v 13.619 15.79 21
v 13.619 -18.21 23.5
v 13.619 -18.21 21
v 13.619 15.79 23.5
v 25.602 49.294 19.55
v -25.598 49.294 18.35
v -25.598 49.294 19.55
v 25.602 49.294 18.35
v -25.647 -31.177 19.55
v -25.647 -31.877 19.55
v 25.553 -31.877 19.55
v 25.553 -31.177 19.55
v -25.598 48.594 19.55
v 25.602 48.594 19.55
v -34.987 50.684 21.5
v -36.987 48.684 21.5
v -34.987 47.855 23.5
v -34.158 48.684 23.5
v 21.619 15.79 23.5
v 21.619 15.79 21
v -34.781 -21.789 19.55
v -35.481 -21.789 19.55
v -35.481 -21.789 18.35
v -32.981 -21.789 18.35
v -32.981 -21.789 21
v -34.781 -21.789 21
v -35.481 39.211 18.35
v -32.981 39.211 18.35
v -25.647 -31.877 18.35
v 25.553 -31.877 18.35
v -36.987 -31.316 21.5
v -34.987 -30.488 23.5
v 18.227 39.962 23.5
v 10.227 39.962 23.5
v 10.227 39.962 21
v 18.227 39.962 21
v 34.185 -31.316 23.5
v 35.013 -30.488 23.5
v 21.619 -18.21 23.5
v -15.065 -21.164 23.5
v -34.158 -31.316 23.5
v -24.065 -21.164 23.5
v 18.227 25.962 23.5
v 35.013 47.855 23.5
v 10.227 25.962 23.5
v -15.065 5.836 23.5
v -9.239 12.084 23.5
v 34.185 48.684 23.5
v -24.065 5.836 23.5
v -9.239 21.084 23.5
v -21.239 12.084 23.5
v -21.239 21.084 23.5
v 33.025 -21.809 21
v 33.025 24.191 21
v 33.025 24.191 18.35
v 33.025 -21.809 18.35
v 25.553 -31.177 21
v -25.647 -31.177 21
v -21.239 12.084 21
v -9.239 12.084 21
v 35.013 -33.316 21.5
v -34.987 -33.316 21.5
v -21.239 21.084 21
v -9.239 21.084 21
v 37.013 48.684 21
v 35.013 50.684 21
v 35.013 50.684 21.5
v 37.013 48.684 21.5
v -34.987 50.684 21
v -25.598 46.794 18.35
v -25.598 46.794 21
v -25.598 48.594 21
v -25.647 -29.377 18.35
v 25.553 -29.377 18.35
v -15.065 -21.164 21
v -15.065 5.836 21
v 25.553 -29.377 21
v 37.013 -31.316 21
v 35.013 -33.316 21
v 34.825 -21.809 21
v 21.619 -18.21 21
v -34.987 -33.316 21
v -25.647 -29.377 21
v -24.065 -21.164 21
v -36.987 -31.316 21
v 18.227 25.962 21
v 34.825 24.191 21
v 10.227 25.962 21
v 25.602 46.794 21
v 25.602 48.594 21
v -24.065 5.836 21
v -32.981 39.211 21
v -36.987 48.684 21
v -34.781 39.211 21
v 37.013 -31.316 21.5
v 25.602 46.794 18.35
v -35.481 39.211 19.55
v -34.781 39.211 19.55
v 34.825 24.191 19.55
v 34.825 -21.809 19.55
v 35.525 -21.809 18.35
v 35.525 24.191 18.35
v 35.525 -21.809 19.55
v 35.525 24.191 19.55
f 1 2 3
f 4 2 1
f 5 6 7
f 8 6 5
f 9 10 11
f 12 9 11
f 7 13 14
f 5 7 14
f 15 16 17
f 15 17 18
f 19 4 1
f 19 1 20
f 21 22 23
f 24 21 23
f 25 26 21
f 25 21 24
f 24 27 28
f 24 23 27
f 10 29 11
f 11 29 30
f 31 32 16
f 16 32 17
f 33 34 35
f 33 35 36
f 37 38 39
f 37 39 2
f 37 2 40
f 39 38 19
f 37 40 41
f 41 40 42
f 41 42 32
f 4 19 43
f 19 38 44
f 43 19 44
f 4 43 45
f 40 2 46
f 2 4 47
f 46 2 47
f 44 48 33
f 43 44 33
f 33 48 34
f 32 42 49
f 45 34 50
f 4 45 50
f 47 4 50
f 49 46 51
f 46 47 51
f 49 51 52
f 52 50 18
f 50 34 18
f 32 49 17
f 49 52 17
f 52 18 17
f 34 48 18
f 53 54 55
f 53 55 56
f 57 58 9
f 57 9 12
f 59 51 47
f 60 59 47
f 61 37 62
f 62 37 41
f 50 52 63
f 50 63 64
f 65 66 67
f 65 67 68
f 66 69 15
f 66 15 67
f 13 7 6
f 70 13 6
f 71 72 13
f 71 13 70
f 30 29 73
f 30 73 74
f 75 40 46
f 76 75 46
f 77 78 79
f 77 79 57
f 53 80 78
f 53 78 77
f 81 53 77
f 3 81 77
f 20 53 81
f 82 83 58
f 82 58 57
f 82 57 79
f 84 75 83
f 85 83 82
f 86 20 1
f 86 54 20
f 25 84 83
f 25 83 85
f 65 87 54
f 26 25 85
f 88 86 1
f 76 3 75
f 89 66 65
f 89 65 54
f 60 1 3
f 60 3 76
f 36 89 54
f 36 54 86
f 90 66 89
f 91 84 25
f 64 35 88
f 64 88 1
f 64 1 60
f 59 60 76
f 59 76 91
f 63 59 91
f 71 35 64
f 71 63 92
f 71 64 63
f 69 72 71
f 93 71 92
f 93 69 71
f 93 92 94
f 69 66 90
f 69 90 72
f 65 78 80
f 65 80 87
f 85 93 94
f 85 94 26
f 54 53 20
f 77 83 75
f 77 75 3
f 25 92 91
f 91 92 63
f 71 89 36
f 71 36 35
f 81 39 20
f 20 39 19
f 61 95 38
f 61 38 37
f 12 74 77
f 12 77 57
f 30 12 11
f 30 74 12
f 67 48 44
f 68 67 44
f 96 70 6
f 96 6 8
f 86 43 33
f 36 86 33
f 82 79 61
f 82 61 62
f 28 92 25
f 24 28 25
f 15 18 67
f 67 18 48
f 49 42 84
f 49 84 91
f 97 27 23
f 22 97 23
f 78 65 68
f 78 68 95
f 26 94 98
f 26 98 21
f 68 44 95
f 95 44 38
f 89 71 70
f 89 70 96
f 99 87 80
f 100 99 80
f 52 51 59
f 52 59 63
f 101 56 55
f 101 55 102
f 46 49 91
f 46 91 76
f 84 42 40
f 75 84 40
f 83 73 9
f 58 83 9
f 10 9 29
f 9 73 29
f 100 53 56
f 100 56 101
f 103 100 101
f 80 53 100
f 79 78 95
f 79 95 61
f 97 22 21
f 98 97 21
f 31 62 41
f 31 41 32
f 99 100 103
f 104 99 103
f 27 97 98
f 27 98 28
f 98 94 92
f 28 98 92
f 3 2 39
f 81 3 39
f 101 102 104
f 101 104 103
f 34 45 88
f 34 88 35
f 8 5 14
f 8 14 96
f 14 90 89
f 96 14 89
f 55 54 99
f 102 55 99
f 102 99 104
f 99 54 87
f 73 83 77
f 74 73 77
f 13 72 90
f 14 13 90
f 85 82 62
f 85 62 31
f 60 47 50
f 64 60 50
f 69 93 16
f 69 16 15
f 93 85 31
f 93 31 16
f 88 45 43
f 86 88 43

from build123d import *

# Parameters (mm, degrees)
PAD006_DEPTH    = 2.5
CHAMFER001_SIZE = 2
SKETCH006_W     = 8
SKETCH006_H     = 14
SKETCH006_H_2   = 34
SKETCH006_W_2   = 9
SKETCH006_H_3   = 27
POCKET001_DEPTH = 5
SKETCH008_W     = 51.2
SKETCH008_H     = 1.8
SKETCH008_W_2   = 1.8
SKETCH008_H_2   = 46
SKETCH008_H_3   = 61
PAD007_DEPTH    = 2.65
SKETCH009_W     = 51.2
SKETCH009_H     = 0.7
SKETCH009_W_2   = 0.7
SKETCH009_H_2   = 46
SKETCH009_H_3   = 61
PAD008_DEPTH    = 1.2
SKETCH014_W     = 12
SKETCH014_H     = 9
POCKET004_DEPTH = 5


with BuildPart() as part:
    # Sketch004 → Pad006 (new body)
    with BuildSketch(Plane.XY.offset(21)):
        Polygon((-34.986794, 50.683687), (35.013206, 50.683687), (37.013212, 48.683681), (37.013212, -31.316319), (35.013206, -33.316325), (-34.986794, -33.316325), (-36.9868, -31.316319), (-36.9868, 48.683681), align=None)
    extrude(amount=PAD006_DEPTH)

    # Chamfer001
    chamfer001_edges = [part.edges().sort_by_distance(p)[0] for p in [
        (0.013206, -33.316325, 23.5),
        (-36.9868, 8.683681, 23.5),
        (-35.986797, 49.683684, 23.5),
        (0.013206, 50.683687, 23.5),
        (36.013209, 49.683684, 23.5),
        (37.013212, 8.683681, 23.5),
        (36.013209, -32.316322, 23.5),
        (-35.986797, -32.316322, 23.5),
    ]]
    chamfer(chamfer001_edges, length=CHAMFER001_SIZE)

    # Sketch006 → Pocket001 (cut)
    with BuildSketch(Plane.XY.offset(23.5)):
        with Locations((14.226603, 32.961599)):
            Rectangle(SKETCH006_W, SKETCH006_H)
        with Locations((17.619118, -1.209573)):
            Rectangle(SKETCH006_W, SKETCH006_H_2)
        with Locations((-19.565168, -7.664242)):
            Rectangle(SKETCH006_W_2, SKETCH006_H_3)
    extrude(amount=-POCKET001_DEPTH, mode=Mode.SUBTRACT)

    # Sketch008 → Pad007 (new body)
    with BuildSketch(Plane(origin=(0, 0, 21), x_dir=(1, 0, 0), z_dir=(0, 0, -1))):
        with Locations((-0.047285, 30.276958)):
            Rectangle(SKETCH008_W, SKETCH008_H)
        with Locations((33.924806, -1.191265)):
            Rectangle(SKETCH008_W_2, SKETCH008_H_2)
        with Locations((0.001681, -47.694109)):
            Rectangle(SKETCH008_W, SKETCH008_H)
        with Locations((-33.880968, -8.711103)):
            Rectangle(SKETCH008_W_2, SKETCH008_H_3)
    extrude(amount=PAD007_DEPTH)

    # Sketch009 → Pad008 (new body)
    with BuildSketch(Plane(origin=(0, 0, 18.35), x_dir=(1, 0, 0), z_dir=(0, 0, -1))):
        with Locations((-0.047285, 31.526958)):
            Rectangle(SKETCH009_W, SKETCH009_H)
        with Locations((35.174806, -1.191265)):
            Rectangle(SKETCH009_W_2, SKETCH009_H_2)
        with Locations((0.001681, -48.944109)):
            Rectangle(SKETCH009_W, SKETCH009_H)
        with Locations((-35.130968, -8.711103)):
            Rectangle(SKETCH009_W_2, SKETCH009_H_3)
    extrude(amount=-PAD008_DEPTH)

    # Sketch014 → Pocket004 (cut)
    with BuildSketch(Plane.XY.offset(23.5)):
        with Locations((-15.238739, 16.5837)):
            Rectangle(SKETCH014_W, SKETCH014_H)
    extrude(amount=-POCKET004_DEPTH, mode=Mode.SUBTRACT)


solid = part.part
